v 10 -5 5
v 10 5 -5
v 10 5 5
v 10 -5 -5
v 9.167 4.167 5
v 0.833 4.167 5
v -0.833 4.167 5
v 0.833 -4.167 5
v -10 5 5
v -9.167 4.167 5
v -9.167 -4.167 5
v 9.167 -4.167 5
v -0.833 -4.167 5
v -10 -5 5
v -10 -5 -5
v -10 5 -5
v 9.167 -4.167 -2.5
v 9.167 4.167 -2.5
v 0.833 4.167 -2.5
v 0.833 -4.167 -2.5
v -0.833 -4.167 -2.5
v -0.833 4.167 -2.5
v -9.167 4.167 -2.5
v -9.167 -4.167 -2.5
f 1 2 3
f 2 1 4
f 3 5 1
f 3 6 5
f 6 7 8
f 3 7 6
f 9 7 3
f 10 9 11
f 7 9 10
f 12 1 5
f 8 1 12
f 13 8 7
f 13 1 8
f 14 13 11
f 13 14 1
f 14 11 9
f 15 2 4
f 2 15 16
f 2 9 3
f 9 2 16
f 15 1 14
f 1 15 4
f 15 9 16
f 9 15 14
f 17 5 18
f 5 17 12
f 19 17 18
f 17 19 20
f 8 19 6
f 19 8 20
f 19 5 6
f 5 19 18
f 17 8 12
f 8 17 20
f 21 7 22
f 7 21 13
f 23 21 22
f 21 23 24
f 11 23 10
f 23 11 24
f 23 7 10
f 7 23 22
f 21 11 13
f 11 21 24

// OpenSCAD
//Tron-Trout
// Created by Juan Angueyra (angueyra@gmail.com
// May 2015

// Variables
bl=10;
wall=bl/6;
// main call

difference() {
	boxes();
	cutout();
	
}

module boxes() {
	translate([bl/2,0,0]) {box(bl);}
	translate([-bl/2,0,0]) {box(bl);}
}



module box(sidelength) {
		cube(size=sidelength,center=true);
}

module cutout() {
	translate([bl/2,0,wall]) {box(bl-wall);}
	translate([-bl/2,0,wall]) {box(bl-wall);}
	// translate([0,0,wall]) {box(bl-wall);}s
}
